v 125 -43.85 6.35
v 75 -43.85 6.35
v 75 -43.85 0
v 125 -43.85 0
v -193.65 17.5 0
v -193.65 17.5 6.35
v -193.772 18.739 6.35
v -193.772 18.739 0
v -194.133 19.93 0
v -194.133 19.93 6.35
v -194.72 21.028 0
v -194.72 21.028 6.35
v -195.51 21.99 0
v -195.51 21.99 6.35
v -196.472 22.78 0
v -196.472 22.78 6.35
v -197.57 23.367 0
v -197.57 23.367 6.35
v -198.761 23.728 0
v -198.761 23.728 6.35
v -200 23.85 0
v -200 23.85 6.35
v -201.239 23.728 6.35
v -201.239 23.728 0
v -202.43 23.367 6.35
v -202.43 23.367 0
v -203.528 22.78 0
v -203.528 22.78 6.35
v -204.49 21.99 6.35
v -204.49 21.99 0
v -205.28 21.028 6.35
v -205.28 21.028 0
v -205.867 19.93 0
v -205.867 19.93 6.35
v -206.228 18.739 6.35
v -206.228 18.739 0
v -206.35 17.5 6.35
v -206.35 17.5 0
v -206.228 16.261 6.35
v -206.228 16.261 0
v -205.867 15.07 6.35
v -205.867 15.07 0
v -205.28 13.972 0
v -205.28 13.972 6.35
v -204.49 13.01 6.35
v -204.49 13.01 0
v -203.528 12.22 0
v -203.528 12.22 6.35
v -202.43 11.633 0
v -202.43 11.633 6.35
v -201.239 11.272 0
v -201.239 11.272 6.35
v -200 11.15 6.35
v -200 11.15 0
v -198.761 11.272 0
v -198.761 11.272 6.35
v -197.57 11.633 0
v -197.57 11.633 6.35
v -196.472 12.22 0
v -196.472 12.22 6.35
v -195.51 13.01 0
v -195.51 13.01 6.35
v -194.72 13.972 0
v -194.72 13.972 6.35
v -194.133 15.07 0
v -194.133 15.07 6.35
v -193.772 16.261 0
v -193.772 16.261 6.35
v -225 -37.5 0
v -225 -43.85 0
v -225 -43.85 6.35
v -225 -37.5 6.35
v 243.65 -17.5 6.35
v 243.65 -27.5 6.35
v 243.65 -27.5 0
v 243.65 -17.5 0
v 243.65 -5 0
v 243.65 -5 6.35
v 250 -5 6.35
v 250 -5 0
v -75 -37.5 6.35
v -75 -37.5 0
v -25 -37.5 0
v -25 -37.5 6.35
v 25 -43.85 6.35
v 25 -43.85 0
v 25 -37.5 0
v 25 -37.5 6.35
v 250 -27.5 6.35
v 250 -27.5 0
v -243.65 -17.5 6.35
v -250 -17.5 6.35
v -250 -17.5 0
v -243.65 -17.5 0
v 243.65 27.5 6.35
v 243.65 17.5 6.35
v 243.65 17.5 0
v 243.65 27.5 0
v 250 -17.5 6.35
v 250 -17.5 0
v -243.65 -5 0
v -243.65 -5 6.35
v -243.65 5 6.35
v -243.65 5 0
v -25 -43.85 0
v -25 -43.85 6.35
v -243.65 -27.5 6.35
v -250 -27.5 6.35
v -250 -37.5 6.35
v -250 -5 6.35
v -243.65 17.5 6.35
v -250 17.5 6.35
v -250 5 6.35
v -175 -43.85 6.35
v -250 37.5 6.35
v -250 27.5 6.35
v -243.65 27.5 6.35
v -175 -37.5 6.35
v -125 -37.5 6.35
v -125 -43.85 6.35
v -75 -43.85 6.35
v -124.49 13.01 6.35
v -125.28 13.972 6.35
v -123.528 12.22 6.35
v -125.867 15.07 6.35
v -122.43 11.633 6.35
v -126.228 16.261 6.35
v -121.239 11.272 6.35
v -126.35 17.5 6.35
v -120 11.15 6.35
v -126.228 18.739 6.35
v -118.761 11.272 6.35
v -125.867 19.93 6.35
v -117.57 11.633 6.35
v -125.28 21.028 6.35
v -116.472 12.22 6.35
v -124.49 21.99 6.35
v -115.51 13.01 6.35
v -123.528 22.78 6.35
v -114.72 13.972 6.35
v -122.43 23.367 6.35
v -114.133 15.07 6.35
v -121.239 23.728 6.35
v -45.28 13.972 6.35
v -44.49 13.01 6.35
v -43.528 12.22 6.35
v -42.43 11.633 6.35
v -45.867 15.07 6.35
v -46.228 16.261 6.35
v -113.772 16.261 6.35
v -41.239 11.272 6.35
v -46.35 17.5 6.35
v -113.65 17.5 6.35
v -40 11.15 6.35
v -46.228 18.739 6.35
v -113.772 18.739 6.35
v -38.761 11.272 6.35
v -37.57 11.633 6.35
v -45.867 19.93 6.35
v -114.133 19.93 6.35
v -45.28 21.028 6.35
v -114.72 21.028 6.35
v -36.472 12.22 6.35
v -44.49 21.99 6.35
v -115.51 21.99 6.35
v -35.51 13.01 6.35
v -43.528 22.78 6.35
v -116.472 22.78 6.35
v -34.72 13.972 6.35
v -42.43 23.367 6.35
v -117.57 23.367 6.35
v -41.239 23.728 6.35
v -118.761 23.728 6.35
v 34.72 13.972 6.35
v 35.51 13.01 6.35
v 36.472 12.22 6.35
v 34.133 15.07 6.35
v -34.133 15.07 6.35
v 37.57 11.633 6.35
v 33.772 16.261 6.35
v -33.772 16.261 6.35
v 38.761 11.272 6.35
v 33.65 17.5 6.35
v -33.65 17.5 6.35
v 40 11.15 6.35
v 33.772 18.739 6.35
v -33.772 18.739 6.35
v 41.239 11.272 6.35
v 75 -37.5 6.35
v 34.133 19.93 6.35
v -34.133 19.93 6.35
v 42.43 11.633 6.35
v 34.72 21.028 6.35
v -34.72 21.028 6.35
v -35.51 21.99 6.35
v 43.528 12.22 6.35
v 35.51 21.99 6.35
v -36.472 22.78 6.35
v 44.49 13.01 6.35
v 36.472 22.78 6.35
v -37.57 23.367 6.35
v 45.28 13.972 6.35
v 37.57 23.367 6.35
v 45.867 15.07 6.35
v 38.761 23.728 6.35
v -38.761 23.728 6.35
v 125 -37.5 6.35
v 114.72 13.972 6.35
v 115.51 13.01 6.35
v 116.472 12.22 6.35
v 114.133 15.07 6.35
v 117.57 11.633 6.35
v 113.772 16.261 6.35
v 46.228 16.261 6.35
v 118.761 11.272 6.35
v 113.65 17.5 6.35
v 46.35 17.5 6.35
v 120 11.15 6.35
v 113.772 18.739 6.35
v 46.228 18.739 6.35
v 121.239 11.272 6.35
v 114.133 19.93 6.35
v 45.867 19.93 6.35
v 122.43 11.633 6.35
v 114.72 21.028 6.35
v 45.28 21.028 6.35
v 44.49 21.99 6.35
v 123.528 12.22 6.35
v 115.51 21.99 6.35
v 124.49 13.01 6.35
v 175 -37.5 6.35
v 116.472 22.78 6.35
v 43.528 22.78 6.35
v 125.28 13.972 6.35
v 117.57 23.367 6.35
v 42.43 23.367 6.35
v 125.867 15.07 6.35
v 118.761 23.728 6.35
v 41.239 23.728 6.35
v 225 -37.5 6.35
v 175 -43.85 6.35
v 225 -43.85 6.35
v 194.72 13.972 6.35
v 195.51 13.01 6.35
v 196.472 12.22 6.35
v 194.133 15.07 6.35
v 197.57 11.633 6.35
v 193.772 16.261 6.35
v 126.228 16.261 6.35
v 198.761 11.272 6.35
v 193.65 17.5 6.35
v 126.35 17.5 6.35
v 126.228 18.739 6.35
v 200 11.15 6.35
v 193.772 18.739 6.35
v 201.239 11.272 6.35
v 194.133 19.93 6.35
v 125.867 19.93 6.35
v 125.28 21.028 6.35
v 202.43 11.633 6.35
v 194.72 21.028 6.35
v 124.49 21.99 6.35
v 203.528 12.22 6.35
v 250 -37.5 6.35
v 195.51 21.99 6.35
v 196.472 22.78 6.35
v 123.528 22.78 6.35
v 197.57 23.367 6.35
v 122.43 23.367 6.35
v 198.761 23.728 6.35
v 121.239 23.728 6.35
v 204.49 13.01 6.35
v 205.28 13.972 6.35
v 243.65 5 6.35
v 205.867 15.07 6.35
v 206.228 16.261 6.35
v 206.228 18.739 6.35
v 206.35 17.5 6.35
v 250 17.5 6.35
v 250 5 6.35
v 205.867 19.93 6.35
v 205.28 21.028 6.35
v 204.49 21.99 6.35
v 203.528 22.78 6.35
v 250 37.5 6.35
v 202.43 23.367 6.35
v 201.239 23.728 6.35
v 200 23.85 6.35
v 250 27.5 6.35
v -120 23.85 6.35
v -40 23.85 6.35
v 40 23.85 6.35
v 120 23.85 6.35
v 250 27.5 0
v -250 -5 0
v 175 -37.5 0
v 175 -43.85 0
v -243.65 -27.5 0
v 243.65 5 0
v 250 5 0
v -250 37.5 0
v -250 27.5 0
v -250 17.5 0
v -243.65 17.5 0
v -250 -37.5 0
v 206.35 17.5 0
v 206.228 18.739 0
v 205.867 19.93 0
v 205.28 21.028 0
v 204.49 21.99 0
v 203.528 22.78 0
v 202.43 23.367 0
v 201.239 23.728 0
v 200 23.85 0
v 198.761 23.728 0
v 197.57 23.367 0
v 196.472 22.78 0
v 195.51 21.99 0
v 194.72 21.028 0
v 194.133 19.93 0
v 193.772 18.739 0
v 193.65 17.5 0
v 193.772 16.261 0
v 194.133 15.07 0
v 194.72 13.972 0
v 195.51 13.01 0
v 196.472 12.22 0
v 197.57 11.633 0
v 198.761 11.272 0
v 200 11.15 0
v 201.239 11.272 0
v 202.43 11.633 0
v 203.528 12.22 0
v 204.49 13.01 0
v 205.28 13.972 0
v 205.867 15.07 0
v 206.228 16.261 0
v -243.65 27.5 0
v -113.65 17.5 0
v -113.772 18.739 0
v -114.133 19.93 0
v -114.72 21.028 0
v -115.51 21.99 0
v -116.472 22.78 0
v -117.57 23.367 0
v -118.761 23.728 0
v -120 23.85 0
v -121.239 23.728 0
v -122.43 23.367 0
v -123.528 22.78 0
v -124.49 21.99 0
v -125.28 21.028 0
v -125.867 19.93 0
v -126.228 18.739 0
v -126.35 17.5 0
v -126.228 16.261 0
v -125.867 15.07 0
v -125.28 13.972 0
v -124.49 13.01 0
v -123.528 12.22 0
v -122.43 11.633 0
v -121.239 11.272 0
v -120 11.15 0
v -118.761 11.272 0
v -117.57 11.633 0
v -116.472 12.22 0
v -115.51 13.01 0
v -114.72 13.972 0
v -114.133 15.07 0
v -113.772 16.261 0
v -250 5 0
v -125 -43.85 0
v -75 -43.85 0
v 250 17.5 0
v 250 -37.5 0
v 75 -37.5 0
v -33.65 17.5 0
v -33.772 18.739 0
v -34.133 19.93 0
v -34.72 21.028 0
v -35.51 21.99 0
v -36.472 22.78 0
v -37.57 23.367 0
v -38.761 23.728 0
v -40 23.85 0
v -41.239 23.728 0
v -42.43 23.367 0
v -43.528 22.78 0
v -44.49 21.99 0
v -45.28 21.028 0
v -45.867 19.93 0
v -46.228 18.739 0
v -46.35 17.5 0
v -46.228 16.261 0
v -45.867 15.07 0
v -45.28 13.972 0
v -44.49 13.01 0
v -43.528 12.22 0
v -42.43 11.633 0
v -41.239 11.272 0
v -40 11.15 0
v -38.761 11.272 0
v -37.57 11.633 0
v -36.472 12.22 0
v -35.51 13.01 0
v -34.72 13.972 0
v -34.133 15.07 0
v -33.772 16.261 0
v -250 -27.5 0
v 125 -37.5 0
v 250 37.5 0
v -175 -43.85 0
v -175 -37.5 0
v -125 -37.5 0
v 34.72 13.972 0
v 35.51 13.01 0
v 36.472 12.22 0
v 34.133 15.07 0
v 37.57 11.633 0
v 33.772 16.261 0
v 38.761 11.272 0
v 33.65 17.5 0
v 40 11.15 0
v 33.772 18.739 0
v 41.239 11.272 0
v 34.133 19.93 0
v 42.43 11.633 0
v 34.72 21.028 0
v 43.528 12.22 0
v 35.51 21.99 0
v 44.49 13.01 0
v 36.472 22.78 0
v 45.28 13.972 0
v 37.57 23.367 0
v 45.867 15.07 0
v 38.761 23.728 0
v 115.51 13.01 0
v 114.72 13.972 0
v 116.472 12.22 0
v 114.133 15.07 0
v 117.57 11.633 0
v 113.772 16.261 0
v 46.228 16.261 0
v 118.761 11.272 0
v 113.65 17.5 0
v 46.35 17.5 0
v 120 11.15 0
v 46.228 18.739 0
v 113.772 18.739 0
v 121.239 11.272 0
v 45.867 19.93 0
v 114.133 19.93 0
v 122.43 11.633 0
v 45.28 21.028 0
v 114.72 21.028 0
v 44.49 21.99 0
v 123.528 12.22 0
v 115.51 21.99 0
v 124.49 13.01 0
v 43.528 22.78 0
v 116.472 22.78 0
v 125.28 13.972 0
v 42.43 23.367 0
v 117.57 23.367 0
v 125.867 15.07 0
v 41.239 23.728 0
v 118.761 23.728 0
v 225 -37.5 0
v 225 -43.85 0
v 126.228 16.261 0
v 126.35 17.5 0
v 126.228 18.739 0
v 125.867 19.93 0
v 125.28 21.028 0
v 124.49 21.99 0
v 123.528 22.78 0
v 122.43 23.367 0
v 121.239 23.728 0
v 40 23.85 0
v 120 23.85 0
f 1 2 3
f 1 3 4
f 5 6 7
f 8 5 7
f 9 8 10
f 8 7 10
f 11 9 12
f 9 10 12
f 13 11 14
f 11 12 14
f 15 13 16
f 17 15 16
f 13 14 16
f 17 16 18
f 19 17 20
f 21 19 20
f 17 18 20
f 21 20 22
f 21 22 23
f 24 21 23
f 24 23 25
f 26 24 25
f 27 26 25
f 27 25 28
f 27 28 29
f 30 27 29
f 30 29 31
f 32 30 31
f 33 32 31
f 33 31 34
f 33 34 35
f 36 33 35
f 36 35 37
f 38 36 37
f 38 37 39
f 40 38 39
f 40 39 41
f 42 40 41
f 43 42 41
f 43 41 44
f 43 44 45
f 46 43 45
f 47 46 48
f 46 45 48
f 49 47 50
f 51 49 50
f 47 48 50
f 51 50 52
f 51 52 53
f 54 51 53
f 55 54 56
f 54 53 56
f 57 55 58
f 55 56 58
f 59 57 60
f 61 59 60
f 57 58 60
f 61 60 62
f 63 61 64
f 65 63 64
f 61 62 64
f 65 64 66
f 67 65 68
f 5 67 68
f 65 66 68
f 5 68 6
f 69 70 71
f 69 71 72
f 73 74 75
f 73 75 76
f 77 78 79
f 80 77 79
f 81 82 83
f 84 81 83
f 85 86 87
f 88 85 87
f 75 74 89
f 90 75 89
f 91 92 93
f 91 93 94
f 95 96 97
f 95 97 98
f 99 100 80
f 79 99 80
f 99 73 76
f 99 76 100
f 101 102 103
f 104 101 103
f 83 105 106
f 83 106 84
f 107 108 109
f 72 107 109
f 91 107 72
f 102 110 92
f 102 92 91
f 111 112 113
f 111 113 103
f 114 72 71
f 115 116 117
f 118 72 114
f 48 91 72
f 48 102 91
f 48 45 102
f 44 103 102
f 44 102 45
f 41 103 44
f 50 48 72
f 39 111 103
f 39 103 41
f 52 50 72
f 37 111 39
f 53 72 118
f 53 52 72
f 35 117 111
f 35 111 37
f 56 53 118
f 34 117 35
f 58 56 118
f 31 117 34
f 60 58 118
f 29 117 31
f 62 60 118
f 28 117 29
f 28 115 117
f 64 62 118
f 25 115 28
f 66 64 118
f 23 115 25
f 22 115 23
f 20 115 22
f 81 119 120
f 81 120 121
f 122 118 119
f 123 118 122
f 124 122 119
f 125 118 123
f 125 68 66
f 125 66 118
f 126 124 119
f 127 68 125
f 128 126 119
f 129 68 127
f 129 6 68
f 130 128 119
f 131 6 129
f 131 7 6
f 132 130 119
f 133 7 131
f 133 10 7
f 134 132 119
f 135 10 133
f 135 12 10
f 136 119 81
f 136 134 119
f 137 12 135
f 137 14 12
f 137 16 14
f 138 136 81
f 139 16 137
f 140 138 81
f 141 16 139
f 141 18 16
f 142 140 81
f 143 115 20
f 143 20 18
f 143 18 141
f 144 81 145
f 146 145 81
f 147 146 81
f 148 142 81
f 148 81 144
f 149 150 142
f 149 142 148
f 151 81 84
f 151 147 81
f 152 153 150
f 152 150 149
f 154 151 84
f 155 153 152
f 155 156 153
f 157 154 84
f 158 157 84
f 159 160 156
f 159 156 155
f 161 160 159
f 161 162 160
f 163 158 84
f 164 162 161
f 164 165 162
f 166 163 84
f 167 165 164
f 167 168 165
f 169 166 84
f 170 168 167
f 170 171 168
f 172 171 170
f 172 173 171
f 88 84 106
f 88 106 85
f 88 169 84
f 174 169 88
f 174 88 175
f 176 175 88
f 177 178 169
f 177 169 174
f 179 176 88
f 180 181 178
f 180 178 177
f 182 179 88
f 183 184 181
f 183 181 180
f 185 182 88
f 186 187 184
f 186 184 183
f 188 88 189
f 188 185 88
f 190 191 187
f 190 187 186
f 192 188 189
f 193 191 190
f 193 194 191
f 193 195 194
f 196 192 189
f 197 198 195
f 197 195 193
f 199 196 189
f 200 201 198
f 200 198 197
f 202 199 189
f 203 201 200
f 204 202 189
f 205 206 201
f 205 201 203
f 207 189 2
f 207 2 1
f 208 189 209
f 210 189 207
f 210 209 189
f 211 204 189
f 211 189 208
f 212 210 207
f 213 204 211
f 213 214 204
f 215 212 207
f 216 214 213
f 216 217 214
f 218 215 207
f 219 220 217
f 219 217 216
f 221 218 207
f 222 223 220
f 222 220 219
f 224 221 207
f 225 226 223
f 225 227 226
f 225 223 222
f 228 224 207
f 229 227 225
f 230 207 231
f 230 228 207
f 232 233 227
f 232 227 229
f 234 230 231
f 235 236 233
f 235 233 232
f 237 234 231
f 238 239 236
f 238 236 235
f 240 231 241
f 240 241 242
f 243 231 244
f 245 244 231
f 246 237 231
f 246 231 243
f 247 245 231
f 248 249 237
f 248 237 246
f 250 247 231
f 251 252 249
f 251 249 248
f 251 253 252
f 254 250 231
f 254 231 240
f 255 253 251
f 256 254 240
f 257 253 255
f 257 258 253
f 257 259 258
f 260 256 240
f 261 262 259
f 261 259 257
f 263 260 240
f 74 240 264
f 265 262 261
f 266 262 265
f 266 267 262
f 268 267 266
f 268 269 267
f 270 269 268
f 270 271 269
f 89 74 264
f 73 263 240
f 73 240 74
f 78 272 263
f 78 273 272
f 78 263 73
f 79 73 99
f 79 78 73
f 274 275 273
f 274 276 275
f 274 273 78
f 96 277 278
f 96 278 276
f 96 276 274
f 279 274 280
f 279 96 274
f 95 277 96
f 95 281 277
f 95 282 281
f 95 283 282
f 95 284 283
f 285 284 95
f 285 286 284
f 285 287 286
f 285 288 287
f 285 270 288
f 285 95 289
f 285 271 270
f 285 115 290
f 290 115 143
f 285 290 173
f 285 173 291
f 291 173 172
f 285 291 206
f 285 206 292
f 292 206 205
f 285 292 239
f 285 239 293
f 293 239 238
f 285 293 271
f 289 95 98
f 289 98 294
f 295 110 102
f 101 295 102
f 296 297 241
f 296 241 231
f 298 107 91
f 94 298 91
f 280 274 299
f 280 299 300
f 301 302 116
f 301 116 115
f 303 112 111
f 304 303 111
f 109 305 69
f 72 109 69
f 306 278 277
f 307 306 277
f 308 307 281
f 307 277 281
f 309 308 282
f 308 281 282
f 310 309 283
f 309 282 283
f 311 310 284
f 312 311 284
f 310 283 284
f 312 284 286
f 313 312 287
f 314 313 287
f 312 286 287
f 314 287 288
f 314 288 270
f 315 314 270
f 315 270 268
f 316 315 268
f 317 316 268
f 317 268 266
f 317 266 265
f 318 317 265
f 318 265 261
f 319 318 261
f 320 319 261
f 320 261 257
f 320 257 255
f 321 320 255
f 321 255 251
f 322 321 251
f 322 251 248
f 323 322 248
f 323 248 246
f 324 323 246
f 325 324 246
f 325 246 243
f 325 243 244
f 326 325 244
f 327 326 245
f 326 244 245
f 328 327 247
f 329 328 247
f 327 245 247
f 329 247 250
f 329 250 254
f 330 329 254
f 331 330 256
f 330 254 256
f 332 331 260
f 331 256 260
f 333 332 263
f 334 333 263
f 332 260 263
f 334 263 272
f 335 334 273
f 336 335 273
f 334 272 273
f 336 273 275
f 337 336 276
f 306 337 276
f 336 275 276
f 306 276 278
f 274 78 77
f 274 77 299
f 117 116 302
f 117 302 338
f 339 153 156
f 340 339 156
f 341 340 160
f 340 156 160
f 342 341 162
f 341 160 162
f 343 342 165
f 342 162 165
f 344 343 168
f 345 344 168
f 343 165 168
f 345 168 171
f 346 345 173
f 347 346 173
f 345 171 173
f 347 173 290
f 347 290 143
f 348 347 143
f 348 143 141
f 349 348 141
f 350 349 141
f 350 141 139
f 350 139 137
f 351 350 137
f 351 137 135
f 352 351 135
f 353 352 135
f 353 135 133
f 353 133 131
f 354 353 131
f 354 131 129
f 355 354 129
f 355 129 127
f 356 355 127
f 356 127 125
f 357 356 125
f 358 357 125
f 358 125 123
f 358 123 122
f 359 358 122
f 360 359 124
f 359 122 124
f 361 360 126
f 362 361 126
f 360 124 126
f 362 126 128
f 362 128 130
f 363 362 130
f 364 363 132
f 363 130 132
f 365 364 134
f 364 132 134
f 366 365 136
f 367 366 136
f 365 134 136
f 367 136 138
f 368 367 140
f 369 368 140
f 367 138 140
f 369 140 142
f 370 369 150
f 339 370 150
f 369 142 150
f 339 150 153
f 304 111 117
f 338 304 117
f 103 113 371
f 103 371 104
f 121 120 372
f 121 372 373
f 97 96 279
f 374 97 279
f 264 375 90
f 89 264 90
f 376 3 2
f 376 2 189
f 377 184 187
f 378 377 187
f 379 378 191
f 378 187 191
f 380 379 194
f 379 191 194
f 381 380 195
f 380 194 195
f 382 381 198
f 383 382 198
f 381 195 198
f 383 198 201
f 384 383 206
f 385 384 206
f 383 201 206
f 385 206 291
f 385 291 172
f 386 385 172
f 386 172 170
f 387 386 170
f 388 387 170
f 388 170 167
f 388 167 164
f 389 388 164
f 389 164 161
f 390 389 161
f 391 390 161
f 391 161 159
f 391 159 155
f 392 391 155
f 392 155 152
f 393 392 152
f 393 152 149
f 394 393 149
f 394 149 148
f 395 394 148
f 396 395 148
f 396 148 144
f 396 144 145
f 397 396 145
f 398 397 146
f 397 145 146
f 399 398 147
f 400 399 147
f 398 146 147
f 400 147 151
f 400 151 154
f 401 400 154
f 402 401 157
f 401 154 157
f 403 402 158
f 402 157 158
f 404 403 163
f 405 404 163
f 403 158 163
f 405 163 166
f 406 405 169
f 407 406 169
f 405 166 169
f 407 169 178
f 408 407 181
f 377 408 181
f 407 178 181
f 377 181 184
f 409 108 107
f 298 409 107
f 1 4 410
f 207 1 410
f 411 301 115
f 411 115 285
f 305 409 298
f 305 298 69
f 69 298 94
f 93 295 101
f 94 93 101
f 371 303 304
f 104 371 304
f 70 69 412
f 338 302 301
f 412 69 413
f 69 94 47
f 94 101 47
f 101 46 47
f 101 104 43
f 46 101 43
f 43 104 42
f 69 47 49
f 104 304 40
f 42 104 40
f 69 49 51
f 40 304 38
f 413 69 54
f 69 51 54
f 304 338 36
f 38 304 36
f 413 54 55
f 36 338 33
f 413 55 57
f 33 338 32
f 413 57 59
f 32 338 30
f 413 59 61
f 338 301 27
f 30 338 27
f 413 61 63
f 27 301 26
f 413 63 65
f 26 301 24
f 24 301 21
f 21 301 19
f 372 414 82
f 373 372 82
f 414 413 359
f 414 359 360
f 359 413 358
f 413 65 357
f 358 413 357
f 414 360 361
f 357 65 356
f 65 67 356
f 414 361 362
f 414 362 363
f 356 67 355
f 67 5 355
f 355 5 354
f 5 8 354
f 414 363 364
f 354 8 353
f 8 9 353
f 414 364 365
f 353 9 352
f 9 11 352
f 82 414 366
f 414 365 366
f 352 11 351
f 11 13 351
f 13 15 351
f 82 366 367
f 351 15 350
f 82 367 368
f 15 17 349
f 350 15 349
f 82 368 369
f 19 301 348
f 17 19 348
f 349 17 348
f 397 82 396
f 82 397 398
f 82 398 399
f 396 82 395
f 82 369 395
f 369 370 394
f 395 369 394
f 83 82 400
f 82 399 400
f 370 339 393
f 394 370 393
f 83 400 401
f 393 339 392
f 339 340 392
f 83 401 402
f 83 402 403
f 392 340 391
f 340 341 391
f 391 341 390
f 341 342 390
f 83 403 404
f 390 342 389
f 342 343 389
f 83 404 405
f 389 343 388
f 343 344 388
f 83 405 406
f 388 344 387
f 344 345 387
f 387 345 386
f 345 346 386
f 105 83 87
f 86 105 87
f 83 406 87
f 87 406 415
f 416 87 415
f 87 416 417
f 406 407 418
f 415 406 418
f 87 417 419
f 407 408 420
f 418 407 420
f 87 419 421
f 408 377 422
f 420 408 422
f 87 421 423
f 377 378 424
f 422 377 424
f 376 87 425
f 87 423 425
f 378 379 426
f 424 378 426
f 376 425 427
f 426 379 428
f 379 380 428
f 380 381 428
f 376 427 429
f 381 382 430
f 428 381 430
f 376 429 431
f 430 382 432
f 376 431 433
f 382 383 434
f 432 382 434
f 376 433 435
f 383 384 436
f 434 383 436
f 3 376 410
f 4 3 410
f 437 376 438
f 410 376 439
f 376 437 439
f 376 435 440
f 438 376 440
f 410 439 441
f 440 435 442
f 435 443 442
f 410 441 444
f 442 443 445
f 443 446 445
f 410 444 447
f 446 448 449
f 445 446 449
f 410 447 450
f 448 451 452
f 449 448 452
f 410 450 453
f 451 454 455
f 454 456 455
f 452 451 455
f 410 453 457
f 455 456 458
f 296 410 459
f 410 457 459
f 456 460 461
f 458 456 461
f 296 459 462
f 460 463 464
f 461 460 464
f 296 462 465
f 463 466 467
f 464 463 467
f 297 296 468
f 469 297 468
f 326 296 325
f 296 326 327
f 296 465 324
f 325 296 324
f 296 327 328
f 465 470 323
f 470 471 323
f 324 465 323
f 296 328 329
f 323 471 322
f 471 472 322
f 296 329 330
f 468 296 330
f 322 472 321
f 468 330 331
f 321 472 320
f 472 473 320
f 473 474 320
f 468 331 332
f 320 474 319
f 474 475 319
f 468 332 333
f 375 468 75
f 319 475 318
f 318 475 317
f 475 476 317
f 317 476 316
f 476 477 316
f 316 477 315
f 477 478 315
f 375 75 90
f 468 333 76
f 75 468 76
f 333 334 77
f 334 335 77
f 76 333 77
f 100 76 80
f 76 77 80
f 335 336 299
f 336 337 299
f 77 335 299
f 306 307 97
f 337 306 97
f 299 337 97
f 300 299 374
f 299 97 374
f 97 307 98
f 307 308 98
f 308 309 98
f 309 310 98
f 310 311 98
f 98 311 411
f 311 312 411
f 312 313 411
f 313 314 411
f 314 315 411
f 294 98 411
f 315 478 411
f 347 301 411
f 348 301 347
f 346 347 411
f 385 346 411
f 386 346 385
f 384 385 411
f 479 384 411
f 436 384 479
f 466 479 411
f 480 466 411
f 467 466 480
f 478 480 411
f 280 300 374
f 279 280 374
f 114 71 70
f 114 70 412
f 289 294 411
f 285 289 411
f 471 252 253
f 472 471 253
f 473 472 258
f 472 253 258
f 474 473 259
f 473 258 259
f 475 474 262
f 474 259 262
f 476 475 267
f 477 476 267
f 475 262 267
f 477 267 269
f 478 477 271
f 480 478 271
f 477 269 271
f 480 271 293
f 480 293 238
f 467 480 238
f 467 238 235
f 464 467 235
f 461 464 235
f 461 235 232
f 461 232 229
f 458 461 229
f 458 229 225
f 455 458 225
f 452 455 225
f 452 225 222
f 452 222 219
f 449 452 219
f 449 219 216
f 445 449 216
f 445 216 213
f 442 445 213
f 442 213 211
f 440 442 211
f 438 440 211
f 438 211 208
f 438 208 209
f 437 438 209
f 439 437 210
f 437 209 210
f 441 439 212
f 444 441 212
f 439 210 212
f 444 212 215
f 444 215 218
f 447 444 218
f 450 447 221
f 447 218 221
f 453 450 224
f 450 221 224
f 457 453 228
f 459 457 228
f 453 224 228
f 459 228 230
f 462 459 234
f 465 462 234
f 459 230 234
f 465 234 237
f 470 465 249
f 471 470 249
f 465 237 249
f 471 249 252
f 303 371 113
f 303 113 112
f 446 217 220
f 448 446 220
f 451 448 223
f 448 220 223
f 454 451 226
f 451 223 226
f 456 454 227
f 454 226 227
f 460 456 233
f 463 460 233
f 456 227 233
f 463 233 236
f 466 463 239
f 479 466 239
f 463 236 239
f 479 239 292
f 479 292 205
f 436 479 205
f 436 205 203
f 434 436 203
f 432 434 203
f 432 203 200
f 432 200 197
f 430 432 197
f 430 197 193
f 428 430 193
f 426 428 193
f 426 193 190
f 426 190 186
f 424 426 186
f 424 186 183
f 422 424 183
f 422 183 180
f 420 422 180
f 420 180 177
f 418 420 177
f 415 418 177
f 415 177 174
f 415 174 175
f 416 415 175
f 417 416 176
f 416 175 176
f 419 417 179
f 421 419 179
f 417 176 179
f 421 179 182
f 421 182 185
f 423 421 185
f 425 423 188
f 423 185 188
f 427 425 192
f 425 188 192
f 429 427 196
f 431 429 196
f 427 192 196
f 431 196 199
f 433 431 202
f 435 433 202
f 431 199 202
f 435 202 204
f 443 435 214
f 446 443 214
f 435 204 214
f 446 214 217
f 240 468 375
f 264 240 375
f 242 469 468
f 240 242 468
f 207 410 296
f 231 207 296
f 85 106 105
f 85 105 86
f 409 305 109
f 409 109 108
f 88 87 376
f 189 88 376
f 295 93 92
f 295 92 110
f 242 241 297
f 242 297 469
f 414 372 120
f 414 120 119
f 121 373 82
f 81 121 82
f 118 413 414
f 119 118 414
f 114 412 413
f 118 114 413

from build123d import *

# Parameters (mm, degrees)
F0_W     = 500
F0_H     = 75
F1_DEPTH = 6.35
F2_W     = 50
F2_H     = 6.35
F3_DEPTH = 6.35
F4_W     = 6.35
F4_H     = 10
F5_DEPTH = 6.351
F6_R     = 6.35
F7_DEPTH = 25


# Not quite as in the source:
# - a length typed as a fraction of an inch, garbled in the dataset ("3 / 203.2 mm" for 3/8 in), is restored


with BuildPart() as f1:
    # F0 (on Top) → F1 (new body)
    with BuildSketch(Plane.XY):
        Rectangle(F0_W, F0_H)
    extrude(amount=F1_DEPTH)

    # F2 (on face) → F3 (join, through all)
    with BuildSketch(Plane.XY.offset(6.35)):
        with Locations((-200, -40.675)):
            Rectangle(F2_W, F2_H)
        with Locations((-100, -40.675)):
            Rectangle(F2_W, F2_H)
        with Locations((0, -40.675)):
            Rectangle(F2_W, F2_H)
        with Locations((100, -40.675)):
            Rectangle(F2_W, F2_H)
        with Locations((200, -40.675)):
            Rectangle(F2_W, F2_H)
    extrude(amount=-F3_DEPTH)

    # F4 (on face) → F5 (cut, through all)
    with BuildSketch(Plane.XY.offset(6.35)):
        with Locations((246.825, 22.5)):
            Rectangle(F4_W, F4_H)
        with Locations((246.825, 0)):
            Rectangle(F4_W, F4_H)
        with Locations((246.825, -22.5)):
            Rectangle(F4_W, F4_H)
        with Locations((-246.825, 22.5)):
            Rectangle(F4_W, F4_H)
        with Locations((-246.825, 0)):
            Rectangle(F4_W, F4_H)
        with Locations((-246.825, -22.5)):
            Rectangle(F4_W, F4_H)
    extrude(amount=-F5_DEPTH, mode=Mode.SUBTRACT)

    # F6 (on face) → F7 (cut)
    with BuildSketch(Plane.XY.offset(6.35)):
        with Locations((-200, 17.5)):
            Circle(F6_R)
        with Locations((-120, 17.5)):
            Circle(F6_R)
        with Locations((-40, 17.5)):
            Circle(F6_R)
        with Locations((40, 17.5)):
            Circle(F6_R)
        with Locations((120, 17.5)):
            Circle(F6_R)
        with Locations((200, 17.5)):
            Circle(F6_R)
    extrude(amount=-F7_DEPTH, mode=Mode.SUBTRACT)


solid = f1.part
